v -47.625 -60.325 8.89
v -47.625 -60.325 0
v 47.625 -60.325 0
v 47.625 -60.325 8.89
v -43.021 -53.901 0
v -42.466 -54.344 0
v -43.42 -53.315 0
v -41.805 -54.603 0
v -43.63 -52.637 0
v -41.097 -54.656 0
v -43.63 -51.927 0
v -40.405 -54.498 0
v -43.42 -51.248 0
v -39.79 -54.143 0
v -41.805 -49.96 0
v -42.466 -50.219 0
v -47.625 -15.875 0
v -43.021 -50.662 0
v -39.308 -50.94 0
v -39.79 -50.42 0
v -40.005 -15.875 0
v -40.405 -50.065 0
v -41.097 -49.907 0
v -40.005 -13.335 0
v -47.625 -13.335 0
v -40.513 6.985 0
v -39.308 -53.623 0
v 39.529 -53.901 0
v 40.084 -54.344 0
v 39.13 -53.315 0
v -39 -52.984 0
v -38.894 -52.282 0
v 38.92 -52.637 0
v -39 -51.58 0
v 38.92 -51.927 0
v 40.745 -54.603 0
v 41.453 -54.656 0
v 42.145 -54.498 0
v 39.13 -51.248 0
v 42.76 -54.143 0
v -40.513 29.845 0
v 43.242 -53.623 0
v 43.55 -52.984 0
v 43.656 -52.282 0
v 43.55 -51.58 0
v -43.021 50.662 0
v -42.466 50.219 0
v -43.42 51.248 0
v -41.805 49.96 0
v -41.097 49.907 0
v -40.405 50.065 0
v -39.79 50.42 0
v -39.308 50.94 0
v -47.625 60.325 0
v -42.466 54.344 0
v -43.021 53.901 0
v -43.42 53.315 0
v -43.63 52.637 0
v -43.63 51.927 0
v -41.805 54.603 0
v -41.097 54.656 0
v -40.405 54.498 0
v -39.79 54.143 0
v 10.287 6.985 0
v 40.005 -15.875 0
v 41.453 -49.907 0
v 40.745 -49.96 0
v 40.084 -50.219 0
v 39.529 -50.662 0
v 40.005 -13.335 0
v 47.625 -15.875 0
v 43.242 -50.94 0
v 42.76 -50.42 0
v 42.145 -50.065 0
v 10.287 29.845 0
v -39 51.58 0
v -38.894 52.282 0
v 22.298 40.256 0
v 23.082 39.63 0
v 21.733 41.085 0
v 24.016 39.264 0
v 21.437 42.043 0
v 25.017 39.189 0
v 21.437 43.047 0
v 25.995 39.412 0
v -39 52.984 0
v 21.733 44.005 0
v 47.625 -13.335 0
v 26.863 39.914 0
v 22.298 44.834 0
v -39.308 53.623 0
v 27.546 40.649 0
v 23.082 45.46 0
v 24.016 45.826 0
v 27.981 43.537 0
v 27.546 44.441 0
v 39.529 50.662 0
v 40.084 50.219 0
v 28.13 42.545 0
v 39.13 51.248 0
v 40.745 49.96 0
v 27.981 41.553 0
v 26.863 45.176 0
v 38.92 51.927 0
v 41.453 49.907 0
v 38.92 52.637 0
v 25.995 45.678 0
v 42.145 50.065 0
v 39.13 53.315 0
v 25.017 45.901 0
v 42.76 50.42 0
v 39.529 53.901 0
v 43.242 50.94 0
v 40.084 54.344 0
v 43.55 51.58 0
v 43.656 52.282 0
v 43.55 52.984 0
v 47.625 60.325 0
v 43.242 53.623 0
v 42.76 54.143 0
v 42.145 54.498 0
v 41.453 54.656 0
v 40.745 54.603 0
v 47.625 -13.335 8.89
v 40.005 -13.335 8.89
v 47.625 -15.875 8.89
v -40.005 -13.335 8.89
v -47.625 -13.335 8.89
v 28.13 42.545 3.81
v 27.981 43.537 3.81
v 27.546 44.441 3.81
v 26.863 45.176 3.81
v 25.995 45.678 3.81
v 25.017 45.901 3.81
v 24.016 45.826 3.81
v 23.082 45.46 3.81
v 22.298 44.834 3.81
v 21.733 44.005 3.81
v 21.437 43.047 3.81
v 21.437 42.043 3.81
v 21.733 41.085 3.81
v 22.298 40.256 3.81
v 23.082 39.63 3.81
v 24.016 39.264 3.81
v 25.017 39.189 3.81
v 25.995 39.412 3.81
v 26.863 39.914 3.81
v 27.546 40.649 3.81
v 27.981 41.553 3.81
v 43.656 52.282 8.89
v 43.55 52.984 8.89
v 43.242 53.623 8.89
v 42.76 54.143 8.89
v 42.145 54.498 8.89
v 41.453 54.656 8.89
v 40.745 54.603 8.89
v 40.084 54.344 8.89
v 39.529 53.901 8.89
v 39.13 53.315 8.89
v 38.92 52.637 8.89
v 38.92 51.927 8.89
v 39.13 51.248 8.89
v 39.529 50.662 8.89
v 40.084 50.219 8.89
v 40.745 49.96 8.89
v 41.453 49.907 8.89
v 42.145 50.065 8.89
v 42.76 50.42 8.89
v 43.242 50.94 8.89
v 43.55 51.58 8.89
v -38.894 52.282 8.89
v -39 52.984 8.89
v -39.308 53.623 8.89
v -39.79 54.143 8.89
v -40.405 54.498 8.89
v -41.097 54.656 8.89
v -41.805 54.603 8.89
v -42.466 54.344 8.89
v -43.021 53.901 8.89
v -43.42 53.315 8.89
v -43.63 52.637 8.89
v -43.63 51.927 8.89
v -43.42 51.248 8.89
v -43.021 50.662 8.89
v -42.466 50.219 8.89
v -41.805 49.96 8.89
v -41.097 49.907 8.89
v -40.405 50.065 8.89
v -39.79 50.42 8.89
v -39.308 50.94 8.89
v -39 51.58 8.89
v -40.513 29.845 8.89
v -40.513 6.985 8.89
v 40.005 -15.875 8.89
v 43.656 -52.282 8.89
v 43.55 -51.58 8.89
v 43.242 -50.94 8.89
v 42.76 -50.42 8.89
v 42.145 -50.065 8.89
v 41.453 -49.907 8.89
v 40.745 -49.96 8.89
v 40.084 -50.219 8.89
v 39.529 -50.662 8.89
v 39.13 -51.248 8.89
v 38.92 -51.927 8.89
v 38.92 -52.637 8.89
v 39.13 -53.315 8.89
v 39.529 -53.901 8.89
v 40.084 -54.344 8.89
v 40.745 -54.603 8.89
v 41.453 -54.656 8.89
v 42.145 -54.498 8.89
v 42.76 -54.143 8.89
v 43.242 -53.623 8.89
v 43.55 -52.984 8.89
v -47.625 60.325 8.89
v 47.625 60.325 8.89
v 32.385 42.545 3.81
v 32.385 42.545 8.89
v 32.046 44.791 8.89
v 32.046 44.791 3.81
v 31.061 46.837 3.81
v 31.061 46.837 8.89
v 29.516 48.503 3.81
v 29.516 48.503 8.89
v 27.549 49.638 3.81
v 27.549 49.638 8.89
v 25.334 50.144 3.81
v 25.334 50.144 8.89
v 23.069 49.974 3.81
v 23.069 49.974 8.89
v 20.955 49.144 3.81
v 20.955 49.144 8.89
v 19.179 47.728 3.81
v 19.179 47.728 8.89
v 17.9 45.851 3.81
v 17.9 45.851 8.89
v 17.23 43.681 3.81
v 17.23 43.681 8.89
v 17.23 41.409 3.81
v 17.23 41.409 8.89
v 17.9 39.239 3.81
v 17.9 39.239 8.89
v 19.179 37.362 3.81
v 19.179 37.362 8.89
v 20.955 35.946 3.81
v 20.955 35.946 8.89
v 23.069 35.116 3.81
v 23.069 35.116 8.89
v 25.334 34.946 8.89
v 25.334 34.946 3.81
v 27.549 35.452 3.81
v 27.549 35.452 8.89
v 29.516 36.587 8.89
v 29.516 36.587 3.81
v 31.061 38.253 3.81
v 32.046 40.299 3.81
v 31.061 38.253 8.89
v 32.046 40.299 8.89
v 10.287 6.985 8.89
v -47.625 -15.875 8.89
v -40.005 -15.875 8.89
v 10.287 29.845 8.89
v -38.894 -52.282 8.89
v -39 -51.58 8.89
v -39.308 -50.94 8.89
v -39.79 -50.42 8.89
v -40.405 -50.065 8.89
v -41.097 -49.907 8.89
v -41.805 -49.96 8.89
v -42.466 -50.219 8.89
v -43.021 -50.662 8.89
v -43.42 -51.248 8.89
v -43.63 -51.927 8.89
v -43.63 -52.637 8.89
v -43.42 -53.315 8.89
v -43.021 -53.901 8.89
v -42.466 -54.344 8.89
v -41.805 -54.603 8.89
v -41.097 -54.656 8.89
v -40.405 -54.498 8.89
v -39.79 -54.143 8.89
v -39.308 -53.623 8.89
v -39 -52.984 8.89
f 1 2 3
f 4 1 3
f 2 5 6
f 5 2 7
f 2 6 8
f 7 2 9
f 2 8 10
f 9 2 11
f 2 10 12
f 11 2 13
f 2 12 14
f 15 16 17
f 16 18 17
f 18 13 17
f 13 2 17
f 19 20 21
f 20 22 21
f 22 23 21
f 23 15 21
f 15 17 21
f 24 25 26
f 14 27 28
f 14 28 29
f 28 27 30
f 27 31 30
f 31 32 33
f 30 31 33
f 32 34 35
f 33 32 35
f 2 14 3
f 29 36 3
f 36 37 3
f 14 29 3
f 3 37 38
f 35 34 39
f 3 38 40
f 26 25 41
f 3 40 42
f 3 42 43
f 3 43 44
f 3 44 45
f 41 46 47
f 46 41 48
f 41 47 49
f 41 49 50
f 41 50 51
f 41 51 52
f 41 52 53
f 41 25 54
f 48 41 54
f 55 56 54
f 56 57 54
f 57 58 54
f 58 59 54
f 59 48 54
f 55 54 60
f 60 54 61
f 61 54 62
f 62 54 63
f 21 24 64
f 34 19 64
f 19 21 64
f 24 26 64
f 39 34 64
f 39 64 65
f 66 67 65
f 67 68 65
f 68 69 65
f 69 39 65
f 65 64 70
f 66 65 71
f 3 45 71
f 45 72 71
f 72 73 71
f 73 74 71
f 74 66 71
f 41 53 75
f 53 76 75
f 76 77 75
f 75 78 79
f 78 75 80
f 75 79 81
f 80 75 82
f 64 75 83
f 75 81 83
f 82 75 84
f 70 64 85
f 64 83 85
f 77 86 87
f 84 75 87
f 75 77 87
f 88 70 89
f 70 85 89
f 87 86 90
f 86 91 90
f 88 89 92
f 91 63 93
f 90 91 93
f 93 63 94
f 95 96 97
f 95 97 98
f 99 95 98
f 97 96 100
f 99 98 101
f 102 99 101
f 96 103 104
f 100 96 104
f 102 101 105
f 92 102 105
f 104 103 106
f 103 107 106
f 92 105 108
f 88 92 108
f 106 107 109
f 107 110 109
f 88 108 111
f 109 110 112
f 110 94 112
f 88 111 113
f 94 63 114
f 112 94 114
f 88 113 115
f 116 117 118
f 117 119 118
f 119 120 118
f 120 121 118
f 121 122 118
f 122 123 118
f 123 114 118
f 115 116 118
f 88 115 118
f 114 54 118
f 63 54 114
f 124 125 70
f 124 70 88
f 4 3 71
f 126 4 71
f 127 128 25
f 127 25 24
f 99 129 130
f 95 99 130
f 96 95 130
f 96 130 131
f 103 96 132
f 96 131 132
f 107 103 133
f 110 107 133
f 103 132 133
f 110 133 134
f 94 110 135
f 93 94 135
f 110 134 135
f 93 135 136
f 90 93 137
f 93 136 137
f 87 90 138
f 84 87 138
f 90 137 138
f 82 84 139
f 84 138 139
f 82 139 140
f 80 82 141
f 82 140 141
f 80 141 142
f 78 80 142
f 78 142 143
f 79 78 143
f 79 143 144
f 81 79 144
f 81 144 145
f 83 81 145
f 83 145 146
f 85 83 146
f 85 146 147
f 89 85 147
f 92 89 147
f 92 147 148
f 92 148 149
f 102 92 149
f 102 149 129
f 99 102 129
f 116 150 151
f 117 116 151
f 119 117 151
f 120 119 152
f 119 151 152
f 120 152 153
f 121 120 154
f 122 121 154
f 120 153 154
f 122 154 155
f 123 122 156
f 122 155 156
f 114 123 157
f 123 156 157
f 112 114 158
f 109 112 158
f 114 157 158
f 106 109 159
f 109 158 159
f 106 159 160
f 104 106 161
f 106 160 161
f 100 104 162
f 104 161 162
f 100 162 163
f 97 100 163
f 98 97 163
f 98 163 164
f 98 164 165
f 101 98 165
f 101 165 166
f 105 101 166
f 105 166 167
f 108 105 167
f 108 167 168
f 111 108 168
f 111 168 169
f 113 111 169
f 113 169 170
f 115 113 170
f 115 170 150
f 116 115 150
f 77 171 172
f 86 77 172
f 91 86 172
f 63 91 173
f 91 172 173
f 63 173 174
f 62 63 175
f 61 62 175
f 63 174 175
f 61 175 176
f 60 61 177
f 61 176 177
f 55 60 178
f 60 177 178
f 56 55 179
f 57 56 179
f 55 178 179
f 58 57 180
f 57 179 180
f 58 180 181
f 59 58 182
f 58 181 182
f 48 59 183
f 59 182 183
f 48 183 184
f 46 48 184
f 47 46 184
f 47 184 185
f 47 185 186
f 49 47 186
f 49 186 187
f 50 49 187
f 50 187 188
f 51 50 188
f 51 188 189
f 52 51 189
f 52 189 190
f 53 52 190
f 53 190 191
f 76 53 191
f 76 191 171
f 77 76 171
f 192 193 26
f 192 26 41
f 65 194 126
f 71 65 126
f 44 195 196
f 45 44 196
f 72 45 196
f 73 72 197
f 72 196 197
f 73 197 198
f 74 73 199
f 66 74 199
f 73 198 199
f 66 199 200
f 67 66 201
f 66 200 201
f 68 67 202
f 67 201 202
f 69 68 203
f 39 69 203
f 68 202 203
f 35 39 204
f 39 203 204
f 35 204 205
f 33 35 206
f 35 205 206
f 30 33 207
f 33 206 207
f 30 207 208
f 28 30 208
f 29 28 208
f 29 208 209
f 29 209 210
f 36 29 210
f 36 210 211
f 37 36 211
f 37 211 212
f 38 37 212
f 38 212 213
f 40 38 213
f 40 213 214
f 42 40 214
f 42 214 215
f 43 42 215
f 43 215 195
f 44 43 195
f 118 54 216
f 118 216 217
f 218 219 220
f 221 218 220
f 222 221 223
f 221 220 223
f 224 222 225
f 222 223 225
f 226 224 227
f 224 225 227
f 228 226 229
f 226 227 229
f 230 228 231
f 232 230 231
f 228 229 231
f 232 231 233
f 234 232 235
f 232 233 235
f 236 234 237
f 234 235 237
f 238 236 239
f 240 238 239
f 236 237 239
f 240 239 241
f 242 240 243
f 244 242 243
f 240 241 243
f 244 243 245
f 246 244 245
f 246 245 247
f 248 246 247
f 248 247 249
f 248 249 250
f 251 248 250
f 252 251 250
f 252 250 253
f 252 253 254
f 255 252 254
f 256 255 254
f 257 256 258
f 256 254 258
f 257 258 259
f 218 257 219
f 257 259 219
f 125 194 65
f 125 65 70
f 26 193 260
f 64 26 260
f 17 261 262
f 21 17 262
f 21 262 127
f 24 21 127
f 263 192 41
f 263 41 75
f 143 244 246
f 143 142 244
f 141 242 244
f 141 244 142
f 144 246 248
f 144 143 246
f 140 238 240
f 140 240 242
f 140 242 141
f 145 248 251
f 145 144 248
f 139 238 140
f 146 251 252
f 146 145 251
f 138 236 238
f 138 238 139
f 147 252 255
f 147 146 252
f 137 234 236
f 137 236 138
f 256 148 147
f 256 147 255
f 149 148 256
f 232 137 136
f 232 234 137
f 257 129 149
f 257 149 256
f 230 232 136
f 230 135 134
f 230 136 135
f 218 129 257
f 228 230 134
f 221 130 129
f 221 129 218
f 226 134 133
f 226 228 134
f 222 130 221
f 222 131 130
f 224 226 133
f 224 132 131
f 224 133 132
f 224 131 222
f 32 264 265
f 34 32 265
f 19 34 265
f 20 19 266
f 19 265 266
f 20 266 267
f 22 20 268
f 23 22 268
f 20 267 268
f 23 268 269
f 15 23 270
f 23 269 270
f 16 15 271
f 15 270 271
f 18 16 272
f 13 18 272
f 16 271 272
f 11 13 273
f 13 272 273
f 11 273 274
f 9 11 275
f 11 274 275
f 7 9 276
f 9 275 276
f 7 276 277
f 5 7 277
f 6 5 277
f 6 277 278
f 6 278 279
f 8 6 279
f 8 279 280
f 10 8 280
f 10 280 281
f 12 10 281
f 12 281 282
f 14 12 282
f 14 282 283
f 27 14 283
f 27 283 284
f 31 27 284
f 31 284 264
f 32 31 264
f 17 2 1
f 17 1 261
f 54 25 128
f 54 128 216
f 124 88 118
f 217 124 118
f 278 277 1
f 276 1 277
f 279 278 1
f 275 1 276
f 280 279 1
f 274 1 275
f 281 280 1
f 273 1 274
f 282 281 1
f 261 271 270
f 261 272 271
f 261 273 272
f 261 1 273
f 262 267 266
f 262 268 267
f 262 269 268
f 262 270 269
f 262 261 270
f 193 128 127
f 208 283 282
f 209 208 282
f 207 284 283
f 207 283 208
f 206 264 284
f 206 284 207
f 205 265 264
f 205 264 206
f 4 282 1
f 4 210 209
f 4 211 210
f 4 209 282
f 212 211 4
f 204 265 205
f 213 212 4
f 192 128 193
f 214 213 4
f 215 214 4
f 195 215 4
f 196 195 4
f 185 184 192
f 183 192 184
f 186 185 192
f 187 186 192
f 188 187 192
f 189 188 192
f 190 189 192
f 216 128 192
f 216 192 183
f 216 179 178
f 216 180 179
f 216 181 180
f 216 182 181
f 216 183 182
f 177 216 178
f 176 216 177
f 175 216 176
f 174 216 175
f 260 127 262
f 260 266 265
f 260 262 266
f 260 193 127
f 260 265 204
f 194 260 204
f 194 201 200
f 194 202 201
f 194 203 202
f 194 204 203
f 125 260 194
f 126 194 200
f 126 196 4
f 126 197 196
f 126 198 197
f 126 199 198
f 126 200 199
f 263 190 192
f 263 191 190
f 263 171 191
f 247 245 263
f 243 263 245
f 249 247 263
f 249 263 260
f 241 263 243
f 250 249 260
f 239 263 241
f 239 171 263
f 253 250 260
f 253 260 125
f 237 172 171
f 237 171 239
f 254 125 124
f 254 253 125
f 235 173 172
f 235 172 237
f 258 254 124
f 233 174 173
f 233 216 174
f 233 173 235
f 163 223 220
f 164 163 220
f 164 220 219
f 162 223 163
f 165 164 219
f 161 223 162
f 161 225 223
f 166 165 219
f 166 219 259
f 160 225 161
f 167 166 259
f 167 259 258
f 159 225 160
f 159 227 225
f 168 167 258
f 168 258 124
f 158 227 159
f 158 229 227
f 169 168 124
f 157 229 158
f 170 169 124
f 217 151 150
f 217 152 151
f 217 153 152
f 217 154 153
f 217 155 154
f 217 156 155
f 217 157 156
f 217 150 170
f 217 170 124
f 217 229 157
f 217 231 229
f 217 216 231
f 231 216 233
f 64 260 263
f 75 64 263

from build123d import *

# Parameters (mm, degrees)
SKETCH1_W           = 95.25
SKETCH1_H           = 120.65
BOSS_EXTRUDE1_DEPTH = 8.89
SKETCH2_OUTSIDE_W   = 128.044
SKETCH2_OUTSIDE_H   = 153.444
SKETCH2_OUTSIDE_W_2 = 95.25
SKETCH2_OUTSIDE_H_2 = 120.65
SKETCH2_OUTSIDE_R   = 2.38125
CUT_EXTRUDE2_DEPTH  = 9.89
SKETCH3_R           = 7.62
CUT_EXTRUDE3_DEPTH  = 5.08
SKETCH4_R           = 3.3655
CUT_EXTRUDE4_DEPTH  = 4.81
SKETCH5_W           = 50.8
SKETCH5_H           = 22.86
CUT_EXTRUDE5_DEPTH  = 9.89
SKETCH6_W           = 7.62
SKETCH6_H           = 2.54
CUT_EXTRUDE6_DEPTH  = 9.89


with BuildPart() as part:
    # Sketch1 → Boss-Extrude1 (new body)
    with BuildSketch(Plane.XY):
        Rectangle(SKETCH1_W, SKETCH1_H)
    extrude(amount=BOSS_EXTRUDE1_DEPTH)

    # Sketch2 outside → Cut-Extrude2 (cut, through all)
    with BuildSketch(Plane.XY.offset(8.89)):
        Rectangle(SKETCH2_OUTSIDE_W, SKETCH2_OUTSIDE_H)
        Rectangle(SKETCH2_OUTSIDE_W_2, SKETCH2_OUTSIDE_H_2, mode=Mode.SUBTRACT)
        with Locations((-41.275, 52.281666667)):
            Circle(SKETCH2_OUTSIDE_R)
        with Locations((41.275, 52.281666667)):
            Circle(SKETCH2_OUTSIDE_R)
        with Locations((41.275, -52.281666667)):
            Circle(SKETCH2_OUTSIDE_R)
        with Locations((-41.275, -52.281666667)):
            Circle(SKETCH2_OUTSIDE_R)
    extrude(amount=-CUT_EXTRUDE2_DEPTH, mode=Mode.SUBTRACT)

    # Sketch3 → Cut-Extrude3 (cut)
    with BuildSketch(Plane.XY.offset(8.89)):
        with Locations((24.765, 42.545)):
            Circle(SKETCH3_R)
    extrude(amount=-CUT_EXTRUDE3_DEPTH, mode=Mode.SUBTRACT)

    # Sketch4 → Cut-Extrude4 (cut, through all)
    with BuildSketch(Plane.XY.offset(3.81)):
        with Locations((24.765, 42.545)):
            Circle(SKETCH4_R)
    extrude(amount=-CUT_EXTRUDE4_DEPTH, mode=Mode.SUBTRACT)

    # Sketch5 → Cut-Extrude5 (cut, through all)
    with BuildSketch(Plane.XY.offset(8.89)):
        with Locations((-15.113, 18.415)):
            Rectangle(SKETCH5_W, SKETCH5_H)
    extrude(amount=-CUT_EXTRUDE5_DEPTH, mode=Mode.SUBTRACT)

    # Sketch6 → Cut-Extrude6 (cut, through all)
    with BuildSketch(Plane.XY.offset(8.89)):
        with Locations((-43.815, -14.605)):
            Rectangle(SKETCH6_W, SKETCH6_H)
        with Locations((43.815, -14.605)):
            Rectangle(SKETCH6_W, SKETCH6_H)
    extrude(amount=-CUT_EXTRUDE6_DEPTH, mode=Mode.SUBTRACT)


solid = part.part
